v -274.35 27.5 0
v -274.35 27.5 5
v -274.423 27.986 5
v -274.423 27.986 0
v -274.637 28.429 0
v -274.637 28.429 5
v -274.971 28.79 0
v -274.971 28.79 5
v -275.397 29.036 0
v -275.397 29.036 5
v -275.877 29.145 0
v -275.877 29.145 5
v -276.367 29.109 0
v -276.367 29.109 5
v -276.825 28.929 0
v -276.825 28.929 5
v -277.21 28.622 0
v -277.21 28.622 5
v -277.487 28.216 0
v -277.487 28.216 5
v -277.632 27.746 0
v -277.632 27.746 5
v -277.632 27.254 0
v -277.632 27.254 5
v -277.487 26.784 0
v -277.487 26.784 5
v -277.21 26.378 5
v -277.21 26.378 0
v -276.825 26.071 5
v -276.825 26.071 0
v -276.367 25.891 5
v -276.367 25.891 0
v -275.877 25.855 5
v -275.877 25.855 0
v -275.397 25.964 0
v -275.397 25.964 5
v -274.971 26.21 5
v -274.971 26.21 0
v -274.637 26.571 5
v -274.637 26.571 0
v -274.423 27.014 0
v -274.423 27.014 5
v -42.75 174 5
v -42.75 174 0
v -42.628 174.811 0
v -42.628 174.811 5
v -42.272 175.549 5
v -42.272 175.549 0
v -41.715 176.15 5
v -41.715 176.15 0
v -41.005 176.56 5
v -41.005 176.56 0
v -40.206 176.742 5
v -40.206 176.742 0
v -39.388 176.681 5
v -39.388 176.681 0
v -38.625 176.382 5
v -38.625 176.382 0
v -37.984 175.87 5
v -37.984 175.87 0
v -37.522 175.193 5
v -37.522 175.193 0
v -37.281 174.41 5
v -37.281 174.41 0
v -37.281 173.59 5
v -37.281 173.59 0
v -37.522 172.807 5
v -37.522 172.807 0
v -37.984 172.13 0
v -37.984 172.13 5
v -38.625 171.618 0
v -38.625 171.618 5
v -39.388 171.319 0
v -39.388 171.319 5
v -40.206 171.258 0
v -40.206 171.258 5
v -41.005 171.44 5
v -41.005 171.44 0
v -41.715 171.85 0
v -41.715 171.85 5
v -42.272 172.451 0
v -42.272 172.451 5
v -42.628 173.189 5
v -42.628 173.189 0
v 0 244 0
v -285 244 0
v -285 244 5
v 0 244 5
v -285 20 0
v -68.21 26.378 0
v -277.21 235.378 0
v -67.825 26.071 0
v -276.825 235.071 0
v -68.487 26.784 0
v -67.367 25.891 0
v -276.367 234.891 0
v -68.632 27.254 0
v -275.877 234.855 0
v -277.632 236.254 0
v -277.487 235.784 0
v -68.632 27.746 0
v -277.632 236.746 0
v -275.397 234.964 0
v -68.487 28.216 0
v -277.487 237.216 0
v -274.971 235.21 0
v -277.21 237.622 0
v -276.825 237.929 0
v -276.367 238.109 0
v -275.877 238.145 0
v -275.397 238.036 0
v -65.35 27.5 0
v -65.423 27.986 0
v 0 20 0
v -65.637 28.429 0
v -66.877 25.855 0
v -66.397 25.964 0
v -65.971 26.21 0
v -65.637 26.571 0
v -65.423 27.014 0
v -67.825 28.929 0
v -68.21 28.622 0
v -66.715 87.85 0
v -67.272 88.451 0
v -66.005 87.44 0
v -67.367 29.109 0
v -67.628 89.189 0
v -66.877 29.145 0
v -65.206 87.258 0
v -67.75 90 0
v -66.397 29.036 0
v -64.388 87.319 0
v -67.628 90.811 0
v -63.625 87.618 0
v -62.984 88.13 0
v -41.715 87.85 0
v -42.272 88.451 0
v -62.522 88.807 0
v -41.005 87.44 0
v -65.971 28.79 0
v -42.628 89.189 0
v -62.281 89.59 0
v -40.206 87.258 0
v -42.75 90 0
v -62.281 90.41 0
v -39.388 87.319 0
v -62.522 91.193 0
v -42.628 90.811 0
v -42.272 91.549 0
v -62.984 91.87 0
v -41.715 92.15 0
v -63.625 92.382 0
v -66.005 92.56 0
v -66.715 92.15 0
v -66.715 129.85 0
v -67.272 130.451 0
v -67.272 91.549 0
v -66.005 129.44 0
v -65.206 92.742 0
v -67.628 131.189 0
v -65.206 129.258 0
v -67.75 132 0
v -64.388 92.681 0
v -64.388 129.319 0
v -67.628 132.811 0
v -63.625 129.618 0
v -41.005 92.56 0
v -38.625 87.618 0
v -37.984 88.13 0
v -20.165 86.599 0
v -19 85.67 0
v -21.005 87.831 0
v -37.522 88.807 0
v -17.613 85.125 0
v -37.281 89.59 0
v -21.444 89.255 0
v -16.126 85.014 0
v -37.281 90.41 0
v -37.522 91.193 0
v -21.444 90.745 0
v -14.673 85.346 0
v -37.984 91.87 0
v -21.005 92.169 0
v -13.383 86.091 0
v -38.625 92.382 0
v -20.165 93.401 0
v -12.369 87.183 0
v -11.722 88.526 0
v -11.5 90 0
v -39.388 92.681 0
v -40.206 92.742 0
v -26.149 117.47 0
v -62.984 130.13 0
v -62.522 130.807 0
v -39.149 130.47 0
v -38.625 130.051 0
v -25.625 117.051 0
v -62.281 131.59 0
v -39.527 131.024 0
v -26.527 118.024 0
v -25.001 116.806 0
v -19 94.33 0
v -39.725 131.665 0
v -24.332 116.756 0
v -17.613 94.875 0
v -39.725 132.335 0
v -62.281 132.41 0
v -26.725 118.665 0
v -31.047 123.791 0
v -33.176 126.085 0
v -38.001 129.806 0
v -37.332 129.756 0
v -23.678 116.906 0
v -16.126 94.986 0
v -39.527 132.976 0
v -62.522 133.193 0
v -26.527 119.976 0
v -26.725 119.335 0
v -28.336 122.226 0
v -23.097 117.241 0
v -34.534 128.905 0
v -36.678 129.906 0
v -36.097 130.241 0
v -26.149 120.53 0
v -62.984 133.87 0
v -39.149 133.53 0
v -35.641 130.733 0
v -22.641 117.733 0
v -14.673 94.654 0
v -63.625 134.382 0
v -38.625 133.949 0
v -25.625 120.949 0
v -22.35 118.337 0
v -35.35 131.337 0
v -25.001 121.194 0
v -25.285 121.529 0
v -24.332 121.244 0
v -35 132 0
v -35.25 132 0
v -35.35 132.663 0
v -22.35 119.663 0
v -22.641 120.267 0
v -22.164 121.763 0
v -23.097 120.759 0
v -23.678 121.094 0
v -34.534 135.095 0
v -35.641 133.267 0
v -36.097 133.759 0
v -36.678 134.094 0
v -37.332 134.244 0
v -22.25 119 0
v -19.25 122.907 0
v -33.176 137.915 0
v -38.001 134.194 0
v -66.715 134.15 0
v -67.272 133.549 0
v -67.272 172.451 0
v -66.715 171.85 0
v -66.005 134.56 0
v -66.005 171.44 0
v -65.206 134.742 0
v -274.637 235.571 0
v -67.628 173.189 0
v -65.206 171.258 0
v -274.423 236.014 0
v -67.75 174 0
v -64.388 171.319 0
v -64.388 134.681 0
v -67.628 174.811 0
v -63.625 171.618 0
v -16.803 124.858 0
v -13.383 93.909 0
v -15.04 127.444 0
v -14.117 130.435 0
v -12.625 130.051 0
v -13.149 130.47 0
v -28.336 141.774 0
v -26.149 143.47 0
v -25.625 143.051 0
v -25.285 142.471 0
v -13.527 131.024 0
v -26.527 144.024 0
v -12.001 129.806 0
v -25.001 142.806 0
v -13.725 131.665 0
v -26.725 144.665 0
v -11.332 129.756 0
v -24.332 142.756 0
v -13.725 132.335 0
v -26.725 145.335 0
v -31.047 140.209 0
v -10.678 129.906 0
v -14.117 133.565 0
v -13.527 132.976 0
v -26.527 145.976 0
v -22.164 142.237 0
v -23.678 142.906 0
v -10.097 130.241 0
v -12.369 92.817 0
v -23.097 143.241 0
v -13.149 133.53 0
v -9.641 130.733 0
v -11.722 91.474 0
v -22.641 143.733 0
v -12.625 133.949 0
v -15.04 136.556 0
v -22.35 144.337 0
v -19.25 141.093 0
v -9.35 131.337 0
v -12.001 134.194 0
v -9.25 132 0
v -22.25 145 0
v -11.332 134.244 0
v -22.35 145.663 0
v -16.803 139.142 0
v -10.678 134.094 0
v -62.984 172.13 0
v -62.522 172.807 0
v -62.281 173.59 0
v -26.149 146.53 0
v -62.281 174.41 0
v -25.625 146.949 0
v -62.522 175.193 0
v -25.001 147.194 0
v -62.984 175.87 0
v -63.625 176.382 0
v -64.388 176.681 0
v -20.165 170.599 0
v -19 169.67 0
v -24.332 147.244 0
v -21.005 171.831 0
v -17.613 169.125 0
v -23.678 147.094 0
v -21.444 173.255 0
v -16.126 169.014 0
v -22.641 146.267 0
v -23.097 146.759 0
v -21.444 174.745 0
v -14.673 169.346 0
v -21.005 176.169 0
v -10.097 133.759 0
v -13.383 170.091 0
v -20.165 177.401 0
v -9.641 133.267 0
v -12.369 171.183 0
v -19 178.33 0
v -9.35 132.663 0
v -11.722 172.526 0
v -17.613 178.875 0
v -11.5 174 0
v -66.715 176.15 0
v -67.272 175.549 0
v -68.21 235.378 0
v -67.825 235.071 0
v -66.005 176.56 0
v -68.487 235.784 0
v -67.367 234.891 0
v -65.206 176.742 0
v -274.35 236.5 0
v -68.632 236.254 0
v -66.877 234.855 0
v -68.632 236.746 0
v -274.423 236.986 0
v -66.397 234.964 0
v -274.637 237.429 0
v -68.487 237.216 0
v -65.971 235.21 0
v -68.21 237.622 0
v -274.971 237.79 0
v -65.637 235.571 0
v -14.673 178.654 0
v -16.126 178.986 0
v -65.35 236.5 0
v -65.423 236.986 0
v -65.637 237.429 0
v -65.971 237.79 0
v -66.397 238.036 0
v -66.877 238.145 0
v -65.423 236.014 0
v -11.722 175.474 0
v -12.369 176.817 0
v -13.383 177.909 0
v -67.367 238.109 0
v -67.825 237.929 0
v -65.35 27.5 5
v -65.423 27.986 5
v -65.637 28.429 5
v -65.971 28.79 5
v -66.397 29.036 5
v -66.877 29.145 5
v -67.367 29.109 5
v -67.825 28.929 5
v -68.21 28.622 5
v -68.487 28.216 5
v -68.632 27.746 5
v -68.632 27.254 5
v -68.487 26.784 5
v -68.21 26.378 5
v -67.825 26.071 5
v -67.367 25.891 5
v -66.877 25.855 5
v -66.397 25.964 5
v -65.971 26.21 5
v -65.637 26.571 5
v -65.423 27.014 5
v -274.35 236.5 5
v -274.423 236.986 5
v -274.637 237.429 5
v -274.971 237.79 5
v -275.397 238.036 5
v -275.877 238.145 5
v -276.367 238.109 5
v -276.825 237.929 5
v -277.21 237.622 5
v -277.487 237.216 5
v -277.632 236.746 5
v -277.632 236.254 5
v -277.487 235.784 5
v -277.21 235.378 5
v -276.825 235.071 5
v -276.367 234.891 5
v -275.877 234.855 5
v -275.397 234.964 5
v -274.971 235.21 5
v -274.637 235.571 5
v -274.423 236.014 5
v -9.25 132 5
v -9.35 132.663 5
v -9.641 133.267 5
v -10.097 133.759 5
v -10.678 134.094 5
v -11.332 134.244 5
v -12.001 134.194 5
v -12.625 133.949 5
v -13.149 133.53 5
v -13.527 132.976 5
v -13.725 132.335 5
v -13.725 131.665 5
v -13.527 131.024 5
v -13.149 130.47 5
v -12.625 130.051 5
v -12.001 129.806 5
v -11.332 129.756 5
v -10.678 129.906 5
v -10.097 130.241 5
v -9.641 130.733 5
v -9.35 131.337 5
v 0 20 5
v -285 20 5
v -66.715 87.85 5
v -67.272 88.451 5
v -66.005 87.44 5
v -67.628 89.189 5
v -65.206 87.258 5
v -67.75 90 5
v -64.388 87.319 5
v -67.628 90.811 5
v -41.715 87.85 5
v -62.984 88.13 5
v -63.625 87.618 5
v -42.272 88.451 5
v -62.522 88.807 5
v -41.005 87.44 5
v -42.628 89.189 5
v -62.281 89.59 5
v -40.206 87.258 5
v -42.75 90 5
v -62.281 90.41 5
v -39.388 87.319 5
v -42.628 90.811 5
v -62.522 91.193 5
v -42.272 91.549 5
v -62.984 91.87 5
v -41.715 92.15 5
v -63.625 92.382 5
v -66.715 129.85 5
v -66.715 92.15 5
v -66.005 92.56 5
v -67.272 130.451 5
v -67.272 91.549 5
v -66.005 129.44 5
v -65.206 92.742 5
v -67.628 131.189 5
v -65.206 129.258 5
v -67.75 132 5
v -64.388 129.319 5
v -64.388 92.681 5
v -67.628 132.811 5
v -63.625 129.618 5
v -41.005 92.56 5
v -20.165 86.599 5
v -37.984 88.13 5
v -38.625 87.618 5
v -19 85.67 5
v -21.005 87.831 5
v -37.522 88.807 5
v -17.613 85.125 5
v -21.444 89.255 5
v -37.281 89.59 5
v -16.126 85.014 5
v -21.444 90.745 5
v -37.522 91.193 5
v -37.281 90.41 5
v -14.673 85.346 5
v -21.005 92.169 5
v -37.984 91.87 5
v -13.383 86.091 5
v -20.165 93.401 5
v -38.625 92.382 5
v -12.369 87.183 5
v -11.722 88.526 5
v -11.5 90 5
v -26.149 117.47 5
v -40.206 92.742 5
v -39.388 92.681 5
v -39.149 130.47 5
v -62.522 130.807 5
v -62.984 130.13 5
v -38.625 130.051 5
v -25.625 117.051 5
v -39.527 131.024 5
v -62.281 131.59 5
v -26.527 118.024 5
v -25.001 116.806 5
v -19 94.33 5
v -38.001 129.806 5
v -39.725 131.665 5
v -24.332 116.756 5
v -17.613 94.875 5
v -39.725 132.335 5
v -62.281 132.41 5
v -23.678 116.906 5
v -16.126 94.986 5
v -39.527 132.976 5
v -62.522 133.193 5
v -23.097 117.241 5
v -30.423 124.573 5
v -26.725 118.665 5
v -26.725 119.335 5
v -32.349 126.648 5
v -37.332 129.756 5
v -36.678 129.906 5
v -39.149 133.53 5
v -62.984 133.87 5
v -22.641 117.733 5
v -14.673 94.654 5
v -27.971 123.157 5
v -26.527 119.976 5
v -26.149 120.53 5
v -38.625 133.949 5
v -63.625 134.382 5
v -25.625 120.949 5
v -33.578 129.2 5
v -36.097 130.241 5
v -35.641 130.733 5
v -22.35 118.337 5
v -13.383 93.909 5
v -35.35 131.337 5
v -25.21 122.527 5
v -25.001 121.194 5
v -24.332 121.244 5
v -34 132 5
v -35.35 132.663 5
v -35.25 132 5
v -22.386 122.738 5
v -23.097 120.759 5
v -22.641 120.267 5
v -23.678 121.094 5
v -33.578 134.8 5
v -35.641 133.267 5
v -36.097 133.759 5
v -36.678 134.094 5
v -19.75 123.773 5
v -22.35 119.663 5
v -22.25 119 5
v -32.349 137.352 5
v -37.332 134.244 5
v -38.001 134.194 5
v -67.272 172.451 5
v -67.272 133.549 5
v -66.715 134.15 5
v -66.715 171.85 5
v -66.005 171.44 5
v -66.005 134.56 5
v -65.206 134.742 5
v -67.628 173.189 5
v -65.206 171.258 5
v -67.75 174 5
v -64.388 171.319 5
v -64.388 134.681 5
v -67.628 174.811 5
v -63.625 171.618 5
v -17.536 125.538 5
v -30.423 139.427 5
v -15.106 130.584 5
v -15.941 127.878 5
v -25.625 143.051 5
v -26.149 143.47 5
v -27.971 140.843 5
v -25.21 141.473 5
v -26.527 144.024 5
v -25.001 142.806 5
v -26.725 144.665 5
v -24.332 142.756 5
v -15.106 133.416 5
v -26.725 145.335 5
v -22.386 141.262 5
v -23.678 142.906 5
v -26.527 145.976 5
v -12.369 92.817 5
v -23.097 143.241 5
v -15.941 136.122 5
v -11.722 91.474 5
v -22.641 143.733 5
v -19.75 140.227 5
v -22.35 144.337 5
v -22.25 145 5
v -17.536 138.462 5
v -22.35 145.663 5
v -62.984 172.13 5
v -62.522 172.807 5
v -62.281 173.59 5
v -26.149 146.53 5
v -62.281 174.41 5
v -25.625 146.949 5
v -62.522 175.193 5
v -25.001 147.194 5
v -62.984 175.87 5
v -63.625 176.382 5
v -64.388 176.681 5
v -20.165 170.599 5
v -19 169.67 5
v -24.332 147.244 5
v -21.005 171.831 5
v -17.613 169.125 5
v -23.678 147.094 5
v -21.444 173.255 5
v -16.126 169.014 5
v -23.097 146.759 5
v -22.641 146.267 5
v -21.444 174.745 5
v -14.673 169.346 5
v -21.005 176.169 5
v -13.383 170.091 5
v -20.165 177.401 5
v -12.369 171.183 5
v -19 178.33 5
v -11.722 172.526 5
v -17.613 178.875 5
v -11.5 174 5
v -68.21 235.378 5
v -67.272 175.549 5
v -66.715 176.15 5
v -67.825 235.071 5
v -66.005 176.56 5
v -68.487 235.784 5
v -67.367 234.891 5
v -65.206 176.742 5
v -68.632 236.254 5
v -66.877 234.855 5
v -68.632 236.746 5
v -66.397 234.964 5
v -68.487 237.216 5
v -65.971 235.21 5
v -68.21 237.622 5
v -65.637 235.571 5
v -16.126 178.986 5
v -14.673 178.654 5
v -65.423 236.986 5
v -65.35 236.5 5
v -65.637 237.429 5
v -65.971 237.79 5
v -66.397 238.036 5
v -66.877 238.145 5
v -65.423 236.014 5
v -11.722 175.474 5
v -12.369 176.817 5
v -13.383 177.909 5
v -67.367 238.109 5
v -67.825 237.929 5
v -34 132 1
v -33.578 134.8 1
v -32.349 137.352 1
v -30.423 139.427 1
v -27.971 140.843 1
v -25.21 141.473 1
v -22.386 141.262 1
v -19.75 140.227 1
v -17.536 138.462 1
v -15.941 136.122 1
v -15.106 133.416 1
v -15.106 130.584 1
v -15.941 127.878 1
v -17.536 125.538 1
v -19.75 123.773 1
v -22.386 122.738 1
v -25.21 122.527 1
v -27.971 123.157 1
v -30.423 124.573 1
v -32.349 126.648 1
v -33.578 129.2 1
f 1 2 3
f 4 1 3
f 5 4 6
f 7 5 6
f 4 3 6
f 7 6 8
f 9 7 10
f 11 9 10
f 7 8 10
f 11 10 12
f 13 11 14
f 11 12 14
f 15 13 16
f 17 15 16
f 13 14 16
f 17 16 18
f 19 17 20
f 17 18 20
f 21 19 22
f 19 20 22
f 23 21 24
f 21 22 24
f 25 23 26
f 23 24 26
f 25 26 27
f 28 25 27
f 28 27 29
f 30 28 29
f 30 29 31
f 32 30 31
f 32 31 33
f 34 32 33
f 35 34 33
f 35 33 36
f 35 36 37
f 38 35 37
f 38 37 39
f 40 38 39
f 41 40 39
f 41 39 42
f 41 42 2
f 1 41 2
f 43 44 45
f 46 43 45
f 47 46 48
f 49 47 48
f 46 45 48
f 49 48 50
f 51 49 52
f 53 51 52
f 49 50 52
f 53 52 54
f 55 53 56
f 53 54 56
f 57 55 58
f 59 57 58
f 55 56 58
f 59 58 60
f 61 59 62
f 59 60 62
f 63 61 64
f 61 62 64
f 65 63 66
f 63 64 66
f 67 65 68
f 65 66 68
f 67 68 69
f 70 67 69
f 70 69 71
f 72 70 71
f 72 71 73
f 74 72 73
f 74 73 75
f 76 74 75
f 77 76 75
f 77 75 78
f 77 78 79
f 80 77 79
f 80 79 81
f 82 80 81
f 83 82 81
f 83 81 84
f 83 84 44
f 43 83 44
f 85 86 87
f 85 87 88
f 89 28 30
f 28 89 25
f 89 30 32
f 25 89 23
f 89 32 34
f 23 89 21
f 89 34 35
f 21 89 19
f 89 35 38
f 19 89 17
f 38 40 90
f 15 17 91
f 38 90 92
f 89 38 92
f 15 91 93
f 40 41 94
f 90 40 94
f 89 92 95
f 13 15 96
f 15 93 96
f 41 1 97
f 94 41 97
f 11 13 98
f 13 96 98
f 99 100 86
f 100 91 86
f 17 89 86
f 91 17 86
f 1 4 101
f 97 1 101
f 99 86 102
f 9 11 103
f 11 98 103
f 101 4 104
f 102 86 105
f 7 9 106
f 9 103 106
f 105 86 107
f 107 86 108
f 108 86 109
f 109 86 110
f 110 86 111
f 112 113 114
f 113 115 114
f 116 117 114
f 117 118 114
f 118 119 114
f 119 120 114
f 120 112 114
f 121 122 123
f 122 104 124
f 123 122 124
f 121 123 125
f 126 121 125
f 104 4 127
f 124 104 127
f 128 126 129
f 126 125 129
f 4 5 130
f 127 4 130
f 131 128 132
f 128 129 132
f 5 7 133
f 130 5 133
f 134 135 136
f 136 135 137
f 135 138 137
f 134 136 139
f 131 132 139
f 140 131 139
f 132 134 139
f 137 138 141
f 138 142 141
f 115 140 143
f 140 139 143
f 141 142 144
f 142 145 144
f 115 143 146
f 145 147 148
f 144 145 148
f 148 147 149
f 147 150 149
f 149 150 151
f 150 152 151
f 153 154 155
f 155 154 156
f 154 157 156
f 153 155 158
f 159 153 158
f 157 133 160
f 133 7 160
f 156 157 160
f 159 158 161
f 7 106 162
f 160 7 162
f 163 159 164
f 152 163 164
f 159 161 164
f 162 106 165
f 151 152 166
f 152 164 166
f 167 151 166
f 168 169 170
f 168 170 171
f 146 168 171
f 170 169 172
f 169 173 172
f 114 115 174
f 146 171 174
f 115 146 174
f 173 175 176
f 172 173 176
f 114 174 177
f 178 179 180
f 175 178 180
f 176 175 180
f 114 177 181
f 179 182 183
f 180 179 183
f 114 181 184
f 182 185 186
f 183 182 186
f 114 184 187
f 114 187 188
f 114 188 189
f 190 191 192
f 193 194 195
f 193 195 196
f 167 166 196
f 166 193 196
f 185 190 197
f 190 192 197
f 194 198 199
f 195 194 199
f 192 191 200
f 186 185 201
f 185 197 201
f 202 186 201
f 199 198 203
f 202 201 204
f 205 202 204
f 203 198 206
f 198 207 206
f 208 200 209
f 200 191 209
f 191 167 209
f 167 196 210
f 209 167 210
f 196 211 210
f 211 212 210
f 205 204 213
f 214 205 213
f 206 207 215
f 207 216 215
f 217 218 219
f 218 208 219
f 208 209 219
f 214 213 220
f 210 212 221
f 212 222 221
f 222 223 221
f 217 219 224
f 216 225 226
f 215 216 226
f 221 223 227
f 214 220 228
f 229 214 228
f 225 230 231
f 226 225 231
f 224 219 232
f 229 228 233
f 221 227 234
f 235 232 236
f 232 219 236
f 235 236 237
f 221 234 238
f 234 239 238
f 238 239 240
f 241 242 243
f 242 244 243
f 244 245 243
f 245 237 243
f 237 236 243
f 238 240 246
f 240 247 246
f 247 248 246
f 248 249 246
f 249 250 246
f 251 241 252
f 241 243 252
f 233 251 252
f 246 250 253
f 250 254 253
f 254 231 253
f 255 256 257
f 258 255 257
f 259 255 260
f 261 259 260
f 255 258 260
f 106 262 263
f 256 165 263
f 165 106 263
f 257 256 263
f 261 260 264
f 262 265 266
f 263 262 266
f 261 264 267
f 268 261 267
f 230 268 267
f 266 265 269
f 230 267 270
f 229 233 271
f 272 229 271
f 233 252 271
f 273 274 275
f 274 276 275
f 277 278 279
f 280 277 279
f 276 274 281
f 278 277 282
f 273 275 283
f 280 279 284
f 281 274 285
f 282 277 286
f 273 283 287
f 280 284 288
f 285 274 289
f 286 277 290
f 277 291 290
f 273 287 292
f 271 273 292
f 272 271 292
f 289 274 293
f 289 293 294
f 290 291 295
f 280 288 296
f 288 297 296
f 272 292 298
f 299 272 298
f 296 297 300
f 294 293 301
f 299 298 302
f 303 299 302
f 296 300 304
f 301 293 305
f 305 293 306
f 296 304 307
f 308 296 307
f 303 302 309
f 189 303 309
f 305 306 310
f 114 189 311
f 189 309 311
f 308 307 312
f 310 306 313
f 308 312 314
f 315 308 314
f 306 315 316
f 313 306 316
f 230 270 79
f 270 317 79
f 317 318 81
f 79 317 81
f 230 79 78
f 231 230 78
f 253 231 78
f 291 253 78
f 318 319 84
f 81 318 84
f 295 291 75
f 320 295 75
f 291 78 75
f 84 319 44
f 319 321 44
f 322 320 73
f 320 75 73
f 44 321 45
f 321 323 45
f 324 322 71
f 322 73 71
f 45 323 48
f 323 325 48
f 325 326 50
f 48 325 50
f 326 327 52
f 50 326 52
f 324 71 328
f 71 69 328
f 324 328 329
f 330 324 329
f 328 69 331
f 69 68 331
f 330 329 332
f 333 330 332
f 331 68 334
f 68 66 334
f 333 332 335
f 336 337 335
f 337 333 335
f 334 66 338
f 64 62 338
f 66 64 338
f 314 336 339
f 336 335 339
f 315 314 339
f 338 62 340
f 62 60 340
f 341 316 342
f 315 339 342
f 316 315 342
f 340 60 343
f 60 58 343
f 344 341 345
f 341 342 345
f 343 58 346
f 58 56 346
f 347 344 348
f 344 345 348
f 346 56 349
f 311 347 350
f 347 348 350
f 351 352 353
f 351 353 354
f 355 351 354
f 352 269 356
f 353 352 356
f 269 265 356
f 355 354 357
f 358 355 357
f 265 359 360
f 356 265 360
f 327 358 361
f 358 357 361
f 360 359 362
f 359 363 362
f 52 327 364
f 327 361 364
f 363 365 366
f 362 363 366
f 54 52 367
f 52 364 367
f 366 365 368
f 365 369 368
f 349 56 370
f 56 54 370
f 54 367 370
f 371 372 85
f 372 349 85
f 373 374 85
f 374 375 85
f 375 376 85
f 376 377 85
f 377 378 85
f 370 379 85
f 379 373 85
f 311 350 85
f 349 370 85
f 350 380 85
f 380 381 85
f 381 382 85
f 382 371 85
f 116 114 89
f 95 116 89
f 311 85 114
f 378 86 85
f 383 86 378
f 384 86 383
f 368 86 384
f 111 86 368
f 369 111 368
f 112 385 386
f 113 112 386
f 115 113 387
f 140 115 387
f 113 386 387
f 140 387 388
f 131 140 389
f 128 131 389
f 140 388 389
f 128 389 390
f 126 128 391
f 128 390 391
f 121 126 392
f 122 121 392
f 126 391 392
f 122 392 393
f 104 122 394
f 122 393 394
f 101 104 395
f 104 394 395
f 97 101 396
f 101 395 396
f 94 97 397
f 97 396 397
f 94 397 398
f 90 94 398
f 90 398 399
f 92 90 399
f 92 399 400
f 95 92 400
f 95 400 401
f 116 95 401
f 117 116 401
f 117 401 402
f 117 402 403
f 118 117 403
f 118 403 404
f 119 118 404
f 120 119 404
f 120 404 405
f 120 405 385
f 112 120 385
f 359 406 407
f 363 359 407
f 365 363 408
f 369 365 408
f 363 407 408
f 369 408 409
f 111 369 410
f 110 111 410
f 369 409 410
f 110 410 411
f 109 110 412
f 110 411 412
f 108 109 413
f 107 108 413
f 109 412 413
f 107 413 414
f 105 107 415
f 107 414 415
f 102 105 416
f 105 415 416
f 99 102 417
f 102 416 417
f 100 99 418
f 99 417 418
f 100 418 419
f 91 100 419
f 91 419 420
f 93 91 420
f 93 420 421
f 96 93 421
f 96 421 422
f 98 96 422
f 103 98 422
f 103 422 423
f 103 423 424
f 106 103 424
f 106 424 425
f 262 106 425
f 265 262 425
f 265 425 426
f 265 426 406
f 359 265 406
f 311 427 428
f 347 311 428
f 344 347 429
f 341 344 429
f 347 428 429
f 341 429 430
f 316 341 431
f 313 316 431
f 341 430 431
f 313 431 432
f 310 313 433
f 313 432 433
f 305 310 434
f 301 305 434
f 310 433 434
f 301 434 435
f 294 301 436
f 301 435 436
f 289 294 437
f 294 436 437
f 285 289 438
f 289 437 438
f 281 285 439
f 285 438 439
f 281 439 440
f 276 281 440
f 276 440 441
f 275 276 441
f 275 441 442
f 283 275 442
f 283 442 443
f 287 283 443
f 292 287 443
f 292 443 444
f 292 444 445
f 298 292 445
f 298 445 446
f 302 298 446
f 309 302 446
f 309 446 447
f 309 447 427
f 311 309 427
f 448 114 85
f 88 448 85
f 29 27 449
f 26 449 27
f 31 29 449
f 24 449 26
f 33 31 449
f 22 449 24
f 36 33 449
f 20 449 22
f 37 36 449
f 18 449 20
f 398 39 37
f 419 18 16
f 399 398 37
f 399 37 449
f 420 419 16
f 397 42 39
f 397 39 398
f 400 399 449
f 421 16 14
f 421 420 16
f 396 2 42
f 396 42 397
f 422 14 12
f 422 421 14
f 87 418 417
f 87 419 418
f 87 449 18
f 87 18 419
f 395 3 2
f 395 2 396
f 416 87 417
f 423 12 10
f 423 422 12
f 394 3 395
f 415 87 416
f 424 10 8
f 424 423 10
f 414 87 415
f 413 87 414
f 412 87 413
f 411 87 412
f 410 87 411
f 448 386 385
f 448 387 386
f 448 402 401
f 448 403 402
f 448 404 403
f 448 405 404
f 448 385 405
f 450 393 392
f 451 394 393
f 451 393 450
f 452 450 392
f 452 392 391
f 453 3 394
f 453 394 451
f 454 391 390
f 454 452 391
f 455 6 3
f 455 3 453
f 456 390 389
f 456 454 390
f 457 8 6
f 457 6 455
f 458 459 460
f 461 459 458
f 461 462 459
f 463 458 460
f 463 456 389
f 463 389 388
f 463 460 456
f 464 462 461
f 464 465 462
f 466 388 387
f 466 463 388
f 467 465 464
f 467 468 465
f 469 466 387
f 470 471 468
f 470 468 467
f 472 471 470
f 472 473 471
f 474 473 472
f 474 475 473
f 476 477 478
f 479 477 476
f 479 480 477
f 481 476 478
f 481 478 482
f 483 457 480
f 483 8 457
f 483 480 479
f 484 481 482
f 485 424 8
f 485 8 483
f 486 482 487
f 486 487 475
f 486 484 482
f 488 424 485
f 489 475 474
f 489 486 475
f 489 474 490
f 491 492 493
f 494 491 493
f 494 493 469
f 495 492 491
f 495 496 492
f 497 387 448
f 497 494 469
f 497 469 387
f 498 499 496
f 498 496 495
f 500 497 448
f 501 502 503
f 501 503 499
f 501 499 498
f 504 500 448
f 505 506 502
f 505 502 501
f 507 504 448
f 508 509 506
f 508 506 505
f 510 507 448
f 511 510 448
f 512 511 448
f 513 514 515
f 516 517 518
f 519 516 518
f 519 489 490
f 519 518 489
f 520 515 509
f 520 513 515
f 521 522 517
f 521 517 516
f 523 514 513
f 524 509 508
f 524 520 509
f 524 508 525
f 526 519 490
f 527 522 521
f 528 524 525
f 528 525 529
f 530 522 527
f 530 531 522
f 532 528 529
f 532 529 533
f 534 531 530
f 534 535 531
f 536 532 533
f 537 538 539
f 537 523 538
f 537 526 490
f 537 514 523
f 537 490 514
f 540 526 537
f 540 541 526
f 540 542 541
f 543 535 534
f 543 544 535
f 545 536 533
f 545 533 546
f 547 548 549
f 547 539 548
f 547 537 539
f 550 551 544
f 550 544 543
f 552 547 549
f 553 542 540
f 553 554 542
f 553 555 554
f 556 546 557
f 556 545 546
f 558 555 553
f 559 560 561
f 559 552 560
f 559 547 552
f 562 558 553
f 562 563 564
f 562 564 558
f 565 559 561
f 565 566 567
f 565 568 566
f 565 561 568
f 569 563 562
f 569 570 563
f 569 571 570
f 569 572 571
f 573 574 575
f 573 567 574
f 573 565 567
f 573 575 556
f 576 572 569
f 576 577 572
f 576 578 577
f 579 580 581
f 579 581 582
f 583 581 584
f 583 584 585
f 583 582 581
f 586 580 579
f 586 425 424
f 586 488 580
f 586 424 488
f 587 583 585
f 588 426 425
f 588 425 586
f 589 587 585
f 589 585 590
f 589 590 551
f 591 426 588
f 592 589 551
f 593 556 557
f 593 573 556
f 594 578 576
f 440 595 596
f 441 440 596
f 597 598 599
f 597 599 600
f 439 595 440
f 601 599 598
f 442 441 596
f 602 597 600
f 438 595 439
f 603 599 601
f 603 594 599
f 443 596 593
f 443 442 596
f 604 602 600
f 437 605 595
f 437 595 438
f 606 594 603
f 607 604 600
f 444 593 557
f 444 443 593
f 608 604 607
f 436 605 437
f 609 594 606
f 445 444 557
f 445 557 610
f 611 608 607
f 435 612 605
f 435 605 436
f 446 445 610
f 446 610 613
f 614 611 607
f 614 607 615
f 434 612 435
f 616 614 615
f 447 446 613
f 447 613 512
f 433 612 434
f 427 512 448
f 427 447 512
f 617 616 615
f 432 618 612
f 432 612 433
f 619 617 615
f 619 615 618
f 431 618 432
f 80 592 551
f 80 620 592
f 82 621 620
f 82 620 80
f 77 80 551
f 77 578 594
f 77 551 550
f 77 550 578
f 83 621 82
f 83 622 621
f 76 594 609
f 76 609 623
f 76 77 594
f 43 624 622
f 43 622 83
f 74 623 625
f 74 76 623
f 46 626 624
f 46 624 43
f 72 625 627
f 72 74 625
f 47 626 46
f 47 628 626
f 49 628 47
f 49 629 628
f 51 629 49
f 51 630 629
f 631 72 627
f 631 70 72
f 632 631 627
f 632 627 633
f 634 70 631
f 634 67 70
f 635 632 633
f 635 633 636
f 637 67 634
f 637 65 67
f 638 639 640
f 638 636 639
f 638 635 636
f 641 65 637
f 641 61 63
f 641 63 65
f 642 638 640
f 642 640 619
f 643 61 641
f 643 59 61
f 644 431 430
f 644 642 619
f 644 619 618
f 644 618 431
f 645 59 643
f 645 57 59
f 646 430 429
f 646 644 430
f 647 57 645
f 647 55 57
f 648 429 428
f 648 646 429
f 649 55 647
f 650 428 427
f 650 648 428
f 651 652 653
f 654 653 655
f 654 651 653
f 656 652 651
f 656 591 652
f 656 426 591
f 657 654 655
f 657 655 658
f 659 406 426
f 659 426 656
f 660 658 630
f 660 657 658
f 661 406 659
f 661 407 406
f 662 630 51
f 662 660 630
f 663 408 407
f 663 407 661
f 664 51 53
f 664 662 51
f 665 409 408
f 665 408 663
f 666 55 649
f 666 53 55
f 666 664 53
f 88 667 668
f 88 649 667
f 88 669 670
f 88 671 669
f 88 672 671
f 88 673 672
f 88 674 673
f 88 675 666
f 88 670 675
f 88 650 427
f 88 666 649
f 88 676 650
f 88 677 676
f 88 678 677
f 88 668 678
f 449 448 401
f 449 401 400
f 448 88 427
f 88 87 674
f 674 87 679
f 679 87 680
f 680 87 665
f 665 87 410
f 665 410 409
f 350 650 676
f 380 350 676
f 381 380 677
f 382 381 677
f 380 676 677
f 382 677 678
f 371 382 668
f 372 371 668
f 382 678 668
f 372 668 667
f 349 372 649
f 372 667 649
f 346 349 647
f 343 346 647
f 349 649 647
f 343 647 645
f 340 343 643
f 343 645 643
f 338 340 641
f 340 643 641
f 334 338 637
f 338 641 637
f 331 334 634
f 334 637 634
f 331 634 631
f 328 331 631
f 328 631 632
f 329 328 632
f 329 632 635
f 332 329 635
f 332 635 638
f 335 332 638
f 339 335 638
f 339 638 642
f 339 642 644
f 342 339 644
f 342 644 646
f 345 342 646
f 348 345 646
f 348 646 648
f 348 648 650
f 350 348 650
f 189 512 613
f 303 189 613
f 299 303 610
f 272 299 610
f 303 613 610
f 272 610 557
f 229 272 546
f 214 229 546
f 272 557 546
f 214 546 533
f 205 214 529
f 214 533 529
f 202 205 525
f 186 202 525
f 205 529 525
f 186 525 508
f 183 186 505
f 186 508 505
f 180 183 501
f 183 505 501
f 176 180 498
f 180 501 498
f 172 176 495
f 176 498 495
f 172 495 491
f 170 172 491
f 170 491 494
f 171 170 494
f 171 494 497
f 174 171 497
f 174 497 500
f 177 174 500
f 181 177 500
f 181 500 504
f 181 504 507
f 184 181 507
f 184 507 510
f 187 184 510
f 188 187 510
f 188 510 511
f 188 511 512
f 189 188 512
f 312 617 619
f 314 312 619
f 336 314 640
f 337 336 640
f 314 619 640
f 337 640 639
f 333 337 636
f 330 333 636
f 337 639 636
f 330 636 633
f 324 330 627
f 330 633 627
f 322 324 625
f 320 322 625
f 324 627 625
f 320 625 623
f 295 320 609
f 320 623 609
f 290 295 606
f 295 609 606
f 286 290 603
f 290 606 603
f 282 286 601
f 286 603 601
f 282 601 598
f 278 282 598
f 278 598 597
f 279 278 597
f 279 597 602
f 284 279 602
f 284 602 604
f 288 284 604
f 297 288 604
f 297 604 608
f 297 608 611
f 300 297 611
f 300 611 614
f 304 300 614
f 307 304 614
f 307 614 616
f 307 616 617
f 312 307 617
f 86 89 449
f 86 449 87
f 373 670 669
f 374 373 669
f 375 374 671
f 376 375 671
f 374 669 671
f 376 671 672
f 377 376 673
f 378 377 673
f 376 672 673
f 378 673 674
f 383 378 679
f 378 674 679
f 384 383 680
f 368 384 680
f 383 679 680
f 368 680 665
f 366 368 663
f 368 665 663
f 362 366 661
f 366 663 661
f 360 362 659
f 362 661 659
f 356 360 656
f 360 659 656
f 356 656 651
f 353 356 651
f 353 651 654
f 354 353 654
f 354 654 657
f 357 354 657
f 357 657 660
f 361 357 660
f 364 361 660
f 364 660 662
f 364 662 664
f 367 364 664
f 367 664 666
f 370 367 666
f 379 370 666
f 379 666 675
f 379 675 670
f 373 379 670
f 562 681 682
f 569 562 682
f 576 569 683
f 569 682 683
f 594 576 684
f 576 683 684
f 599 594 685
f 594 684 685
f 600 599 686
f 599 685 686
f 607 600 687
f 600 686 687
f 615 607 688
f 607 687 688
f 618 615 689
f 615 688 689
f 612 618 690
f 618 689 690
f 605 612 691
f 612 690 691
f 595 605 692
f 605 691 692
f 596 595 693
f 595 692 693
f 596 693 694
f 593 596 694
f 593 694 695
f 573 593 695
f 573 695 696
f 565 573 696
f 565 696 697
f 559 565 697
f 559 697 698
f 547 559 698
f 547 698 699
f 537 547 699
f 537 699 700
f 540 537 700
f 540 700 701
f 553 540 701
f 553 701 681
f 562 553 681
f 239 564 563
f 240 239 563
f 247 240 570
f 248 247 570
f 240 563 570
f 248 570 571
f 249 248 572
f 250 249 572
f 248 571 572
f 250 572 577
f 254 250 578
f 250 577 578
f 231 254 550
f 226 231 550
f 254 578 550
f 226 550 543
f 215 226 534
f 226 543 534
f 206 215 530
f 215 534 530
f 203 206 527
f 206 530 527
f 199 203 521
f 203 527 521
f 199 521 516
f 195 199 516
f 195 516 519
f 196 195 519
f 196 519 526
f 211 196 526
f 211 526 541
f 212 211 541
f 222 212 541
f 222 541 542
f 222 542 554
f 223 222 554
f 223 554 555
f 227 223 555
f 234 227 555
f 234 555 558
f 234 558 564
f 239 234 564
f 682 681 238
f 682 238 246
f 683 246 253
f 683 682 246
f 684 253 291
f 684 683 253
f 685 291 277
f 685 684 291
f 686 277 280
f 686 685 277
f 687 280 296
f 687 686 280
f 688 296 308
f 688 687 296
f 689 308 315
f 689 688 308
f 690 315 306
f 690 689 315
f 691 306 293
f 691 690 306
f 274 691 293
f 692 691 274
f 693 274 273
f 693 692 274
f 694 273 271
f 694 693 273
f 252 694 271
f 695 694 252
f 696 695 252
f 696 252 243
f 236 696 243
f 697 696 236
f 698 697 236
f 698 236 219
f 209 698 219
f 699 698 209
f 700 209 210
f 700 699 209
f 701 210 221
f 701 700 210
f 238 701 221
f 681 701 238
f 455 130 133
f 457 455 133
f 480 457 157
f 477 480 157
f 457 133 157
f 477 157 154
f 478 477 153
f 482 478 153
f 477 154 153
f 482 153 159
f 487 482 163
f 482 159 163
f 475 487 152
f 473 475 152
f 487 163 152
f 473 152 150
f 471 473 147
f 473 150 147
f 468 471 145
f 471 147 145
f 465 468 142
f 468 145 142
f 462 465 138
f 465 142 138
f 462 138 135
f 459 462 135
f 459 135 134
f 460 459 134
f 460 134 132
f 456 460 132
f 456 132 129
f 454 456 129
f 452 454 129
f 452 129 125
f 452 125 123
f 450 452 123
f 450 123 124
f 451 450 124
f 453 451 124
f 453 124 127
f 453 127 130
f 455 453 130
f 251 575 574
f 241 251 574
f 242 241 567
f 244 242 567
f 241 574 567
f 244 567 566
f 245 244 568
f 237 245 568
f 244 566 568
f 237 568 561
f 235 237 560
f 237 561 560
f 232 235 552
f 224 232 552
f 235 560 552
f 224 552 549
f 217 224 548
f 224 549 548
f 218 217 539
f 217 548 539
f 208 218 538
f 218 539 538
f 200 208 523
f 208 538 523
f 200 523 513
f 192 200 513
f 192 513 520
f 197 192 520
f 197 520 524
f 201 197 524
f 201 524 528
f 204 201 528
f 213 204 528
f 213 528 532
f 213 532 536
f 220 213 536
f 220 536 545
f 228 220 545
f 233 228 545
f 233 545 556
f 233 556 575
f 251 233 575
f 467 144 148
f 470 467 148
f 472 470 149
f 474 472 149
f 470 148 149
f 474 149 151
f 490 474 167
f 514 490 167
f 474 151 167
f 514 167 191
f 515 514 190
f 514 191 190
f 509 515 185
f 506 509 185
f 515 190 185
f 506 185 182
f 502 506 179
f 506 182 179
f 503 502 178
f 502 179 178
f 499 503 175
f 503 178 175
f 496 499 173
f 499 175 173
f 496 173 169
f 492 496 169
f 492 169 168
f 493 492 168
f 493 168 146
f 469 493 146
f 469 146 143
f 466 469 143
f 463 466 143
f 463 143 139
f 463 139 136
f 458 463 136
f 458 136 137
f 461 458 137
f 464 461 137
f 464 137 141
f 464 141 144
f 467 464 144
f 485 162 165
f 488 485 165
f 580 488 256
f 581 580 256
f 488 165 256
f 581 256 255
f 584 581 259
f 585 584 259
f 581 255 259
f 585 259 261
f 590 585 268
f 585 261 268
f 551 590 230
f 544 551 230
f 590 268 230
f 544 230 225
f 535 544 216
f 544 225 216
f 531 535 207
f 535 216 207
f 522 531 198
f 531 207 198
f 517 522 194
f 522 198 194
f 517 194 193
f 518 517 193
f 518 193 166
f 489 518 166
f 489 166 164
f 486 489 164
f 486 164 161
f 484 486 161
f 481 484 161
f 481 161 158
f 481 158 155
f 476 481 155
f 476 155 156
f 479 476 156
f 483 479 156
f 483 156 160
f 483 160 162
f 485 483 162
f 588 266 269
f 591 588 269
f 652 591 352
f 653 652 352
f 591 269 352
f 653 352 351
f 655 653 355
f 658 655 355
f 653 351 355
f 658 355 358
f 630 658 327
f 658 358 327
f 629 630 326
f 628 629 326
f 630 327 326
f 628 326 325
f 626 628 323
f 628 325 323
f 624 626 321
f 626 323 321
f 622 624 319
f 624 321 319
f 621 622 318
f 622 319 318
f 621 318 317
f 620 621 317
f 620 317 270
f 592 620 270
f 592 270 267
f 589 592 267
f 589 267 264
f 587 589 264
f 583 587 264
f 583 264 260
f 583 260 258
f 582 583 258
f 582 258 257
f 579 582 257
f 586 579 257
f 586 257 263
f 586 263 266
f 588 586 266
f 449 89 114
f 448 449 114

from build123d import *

# Parameters (mm, degrees)
SCHIZZO1_W                   = 285
SCHIZZO1_H                   = 224
ESTRUSIONE_ESTRUSIONE1_DEPTH = 5
TAGLIO_ESTRUSIONE1_REACH     = 377.215
SCHIZZO2_R                   = 9.5
SMUSSO1_SIZE                 = 1
FORO_PER_VITE_M4_1_D         = 4.5
FORO_PER_VITE_M4_1_DEPTH     = 8
FORO_PER_VITE_M4_1_TIP       = 1.351936393
TAGLIO_ESTRUSIONE2_REACH     = 377.215
SCHIZZO6_R                   = 5
FORO_PER_VITE_M5_2_D         = 5.5
FORO_PER_VITE_M5_2_DEPTH     = 5
FORO_FILETTATO_M4_1_D        = 3.3


with BuildPart() as part:
    # Schizzo1 → Estrusione-Estrusione1 (new body)
    with BuildSketch(Plane.XY):
        with Locations((-142.5, 132)):
            Rectangle(SCHIZZO1_W, SCHIZZO1_H)
    extrude(amount=ESTRUSIONE_ESTRUSIONE1_DEPTH)

    # Schizzo2 → Taglio-Estrusione1 (cut, up to next)
    with BuildSketch(Plane(origin=(0, 0, 0), x_dir=(-1, 0, 0), z_dir=(0, 0, -1)), mode=Mode.PRIVATE) as taglio_estrusione1_sk1:
        with Locations((24.5, 132)):
            Circle(SCHIZZO2_R)
    taglio_estrusione1_tool1 = extrude(taglio_estrusione1_sk1.sketch, amount=-TAGLIO_ESTRUSIONE1_REACH, mode=Mode.PRIVATE) & part.part
    add(taglio_estrusione1_tool1.solids().sort_by_distance((-24.5, 132, 0))[0], mode=Mode.SUBTRACT)

    # Smusso1
    smusso1_edges = [part.edges().sort_by_distance(p)[0] for p in [
        (-15, 132, 0),
    ]]
    chamfer(smusso1_edges, length=SMUSSO1_SIZE)

    # Foro per Vite M4-1
    with Locations(Plane(origin=(0, 0, 0), x_dir=(-1, 0, 0), z_dir=(0, 0, -1))):
        with Locations((24.5, 119), (37.5, 132), (24.5, 145), (11.5, 132)):
            Hole(FORO_PER_VITE_M4_1_D / 2, depth=FORO_PER_VITE_M4_1_DEPTH)
            with Locations((0, 0, -(FORO_PER_VITE_M4_1_DEPTH + FORO_PER_VITE_M4_1_TIP / 2))):  # 118° drill point
                Cone(0, FORO_PER_VITE_M4_1_D / 2, FORO_PER_VITE_M4_1_TIP, mode=Mode.SUBTRACT)

    # Schizzo6 → Taglio-Estrusione2 (cut, up to next)
    with BuildSketch(Plane.XY.offset(5), mode=Mode.PRIVATE) as taglio_estrusione2_sk1:
        with Locations((-16.5, 90)):
            Circle(SCHIZZO6_R)
    taglio_estrusione2_tool1 = extrude(taglio_estrusione2_sk1.sketch, amount=-TAGLIO_ESTRUSIONE2_REACH, mode=Mode.PRIVATE) & part.part
    # Schizzo6 → Taglio-Estrusione2 (cut, up to next)
    with BuildSketch(Plane.XY.offset(5), mode=Mode.PRIVATE) as taglio_estrusione2_sk2:
        with Locations((-16.5, 174)):
            Circle(SCHIZZO6_R)
    taglio_estrusione2_tool2 = extrude(taglio_estrusione2_sk2.sketch, amount=-TAGLIO_ESTRUSIONE2_REACH, mode=Mode.PRIVATE) & part.part
    add(taglio_estrusione2_tool1.solids().sort_by_distance((-16.5, 90, 5))[0], mode=Mode.SUBTRACT)
    add(taglio_estrusione2_tool2.solids().sort_by_distance((-16.5, 174, 5))[0], mode=Mode.SUBTRACT)

    # Foro per Vite M5-2
    with Locations(Plane.XY.offset(5)):
        with Locations((-27.952976608, 298.668851704), (-40, 90), (-65, 132), (-40, 174), (-65, 174), (-65, 90)):
            Hole(FORO_PER_VITE_M5_2_D / 2, depth=FORO_PER_VITE_M5_2_DEPTH)

    # Foro filettato M4-1 (through all)
    with Locations(Plane(origin=(0, 0, 0), x_dir=(-1, 0, 0), z_dir=(0, 0, -1))):
        with Locations((276, 27.5), (67, 27.5), (276, 236.5), (67, 236.5)):
            Hole(FORO_FILETTATO_M4_1_D / 2)


solid = part.part
